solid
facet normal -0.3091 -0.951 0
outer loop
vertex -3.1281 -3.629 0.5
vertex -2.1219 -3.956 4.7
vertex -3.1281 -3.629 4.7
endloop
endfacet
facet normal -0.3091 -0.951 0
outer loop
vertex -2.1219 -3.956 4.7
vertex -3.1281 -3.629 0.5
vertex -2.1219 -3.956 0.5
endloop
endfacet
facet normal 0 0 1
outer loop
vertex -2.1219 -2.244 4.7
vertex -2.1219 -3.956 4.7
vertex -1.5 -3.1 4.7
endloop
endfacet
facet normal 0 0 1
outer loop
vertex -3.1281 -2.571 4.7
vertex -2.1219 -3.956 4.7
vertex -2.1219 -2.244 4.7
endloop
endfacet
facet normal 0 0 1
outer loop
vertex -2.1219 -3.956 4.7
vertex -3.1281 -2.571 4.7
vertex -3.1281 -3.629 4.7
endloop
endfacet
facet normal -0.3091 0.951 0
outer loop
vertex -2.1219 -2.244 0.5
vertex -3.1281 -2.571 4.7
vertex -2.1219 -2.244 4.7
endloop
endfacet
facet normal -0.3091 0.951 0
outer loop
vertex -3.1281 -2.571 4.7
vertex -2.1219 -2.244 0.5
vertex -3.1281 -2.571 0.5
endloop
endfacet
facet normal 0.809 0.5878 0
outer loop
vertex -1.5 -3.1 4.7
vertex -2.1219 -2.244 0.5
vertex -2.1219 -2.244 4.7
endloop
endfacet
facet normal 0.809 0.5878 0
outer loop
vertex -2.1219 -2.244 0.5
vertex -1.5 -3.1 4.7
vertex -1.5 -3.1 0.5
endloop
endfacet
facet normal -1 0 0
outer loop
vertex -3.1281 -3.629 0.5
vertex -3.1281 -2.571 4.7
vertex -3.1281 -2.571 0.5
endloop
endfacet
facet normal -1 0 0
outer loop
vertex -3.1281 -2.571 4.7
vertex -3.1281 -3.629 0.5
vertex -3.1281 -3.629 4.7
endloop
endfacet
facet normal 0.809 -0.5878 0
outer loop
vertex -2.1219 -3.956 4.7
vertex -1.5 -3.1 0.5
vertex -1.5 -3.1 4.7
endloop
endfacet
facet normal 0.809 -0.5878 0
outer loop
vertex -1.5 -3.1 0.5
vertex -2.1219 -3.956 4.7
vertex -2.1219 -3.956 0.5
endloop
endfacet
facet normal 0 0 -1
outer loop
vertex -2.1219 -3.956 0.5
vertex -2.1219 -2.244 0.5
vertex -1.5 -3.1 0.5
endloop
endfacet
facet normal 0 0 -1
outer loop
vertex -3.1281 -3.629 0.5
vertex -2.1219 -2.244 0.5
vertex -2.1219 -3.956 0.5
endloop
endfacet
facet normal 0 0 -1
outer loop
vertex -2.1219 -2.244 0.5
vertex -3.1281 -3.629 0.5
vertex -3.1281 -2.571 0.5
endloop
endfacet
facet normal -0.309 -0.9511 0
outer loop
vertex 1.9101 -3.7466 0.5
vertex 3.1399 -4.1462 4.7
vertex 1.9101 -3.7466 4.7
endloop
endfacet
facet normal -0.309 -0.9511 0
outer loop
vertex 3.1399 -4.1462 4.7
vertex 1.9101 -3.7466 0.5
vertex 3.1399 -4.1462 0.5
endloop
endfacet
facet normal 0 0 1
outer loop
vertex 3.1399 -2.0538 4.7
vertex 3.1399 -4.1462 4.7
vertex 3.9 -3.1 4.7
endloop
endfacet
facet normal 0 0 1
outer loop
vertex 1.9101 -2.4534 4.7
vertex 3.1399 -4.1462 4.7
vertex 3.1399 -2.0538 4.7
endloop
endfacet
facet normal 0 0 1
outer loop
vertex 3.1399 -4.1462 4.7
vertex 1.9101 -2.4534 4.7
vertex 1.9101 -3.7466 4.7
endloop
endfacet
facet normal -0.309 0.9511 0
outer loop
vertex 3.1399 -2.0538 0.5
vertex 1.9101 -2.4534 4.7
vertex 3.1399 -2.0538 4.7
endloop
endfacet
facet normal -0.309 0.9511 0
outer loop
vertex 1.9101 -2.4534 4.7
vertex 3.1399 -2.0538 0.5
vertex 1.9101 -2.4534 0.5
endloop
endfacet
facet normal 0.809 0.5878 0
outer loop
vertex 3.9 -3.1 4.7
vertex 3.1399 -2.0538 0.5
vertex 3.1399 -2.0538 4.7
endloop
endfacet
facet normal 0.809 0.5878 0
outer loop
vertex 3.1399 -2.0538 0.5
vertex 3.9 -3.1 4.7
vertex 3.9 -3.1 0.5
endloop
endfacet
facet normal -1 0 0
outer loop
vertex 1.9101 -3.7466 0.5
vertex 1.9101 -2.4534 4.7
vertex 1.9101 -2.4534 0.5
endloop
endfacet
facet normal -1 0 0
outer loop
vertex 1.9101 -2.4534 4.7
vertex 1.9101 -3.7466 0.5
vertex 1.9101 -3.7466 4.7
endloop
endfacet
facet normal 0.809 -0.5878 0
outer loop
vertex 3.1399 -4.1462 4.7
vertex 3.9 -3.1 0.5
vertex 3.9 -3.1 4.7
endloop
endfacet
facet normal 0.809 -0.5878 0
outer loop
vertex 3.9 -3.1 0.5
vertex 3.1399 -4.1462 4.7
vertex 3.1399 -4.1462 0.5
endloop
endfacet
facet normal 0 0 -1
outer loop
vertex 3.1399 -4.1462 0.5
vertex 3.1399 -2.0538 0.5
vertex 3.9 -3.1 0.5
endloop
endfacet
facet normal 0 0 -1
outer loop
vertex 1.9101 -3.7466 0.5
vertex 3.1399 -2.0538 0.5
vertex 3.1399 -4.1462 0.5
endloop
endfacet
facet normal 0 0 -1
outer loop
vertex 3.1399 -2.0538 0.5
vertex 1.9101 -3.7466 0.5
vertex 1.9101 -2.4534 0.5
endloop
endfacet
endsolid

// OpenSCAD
union() {
  translate([-2.4, -3.1, 0.5]) cylinder(h=4.2, r=0.9, center=false);
  translate([2.8, -3.1, 0.5]) cylinder(h=4.2, r=1.1, center=false);
}
